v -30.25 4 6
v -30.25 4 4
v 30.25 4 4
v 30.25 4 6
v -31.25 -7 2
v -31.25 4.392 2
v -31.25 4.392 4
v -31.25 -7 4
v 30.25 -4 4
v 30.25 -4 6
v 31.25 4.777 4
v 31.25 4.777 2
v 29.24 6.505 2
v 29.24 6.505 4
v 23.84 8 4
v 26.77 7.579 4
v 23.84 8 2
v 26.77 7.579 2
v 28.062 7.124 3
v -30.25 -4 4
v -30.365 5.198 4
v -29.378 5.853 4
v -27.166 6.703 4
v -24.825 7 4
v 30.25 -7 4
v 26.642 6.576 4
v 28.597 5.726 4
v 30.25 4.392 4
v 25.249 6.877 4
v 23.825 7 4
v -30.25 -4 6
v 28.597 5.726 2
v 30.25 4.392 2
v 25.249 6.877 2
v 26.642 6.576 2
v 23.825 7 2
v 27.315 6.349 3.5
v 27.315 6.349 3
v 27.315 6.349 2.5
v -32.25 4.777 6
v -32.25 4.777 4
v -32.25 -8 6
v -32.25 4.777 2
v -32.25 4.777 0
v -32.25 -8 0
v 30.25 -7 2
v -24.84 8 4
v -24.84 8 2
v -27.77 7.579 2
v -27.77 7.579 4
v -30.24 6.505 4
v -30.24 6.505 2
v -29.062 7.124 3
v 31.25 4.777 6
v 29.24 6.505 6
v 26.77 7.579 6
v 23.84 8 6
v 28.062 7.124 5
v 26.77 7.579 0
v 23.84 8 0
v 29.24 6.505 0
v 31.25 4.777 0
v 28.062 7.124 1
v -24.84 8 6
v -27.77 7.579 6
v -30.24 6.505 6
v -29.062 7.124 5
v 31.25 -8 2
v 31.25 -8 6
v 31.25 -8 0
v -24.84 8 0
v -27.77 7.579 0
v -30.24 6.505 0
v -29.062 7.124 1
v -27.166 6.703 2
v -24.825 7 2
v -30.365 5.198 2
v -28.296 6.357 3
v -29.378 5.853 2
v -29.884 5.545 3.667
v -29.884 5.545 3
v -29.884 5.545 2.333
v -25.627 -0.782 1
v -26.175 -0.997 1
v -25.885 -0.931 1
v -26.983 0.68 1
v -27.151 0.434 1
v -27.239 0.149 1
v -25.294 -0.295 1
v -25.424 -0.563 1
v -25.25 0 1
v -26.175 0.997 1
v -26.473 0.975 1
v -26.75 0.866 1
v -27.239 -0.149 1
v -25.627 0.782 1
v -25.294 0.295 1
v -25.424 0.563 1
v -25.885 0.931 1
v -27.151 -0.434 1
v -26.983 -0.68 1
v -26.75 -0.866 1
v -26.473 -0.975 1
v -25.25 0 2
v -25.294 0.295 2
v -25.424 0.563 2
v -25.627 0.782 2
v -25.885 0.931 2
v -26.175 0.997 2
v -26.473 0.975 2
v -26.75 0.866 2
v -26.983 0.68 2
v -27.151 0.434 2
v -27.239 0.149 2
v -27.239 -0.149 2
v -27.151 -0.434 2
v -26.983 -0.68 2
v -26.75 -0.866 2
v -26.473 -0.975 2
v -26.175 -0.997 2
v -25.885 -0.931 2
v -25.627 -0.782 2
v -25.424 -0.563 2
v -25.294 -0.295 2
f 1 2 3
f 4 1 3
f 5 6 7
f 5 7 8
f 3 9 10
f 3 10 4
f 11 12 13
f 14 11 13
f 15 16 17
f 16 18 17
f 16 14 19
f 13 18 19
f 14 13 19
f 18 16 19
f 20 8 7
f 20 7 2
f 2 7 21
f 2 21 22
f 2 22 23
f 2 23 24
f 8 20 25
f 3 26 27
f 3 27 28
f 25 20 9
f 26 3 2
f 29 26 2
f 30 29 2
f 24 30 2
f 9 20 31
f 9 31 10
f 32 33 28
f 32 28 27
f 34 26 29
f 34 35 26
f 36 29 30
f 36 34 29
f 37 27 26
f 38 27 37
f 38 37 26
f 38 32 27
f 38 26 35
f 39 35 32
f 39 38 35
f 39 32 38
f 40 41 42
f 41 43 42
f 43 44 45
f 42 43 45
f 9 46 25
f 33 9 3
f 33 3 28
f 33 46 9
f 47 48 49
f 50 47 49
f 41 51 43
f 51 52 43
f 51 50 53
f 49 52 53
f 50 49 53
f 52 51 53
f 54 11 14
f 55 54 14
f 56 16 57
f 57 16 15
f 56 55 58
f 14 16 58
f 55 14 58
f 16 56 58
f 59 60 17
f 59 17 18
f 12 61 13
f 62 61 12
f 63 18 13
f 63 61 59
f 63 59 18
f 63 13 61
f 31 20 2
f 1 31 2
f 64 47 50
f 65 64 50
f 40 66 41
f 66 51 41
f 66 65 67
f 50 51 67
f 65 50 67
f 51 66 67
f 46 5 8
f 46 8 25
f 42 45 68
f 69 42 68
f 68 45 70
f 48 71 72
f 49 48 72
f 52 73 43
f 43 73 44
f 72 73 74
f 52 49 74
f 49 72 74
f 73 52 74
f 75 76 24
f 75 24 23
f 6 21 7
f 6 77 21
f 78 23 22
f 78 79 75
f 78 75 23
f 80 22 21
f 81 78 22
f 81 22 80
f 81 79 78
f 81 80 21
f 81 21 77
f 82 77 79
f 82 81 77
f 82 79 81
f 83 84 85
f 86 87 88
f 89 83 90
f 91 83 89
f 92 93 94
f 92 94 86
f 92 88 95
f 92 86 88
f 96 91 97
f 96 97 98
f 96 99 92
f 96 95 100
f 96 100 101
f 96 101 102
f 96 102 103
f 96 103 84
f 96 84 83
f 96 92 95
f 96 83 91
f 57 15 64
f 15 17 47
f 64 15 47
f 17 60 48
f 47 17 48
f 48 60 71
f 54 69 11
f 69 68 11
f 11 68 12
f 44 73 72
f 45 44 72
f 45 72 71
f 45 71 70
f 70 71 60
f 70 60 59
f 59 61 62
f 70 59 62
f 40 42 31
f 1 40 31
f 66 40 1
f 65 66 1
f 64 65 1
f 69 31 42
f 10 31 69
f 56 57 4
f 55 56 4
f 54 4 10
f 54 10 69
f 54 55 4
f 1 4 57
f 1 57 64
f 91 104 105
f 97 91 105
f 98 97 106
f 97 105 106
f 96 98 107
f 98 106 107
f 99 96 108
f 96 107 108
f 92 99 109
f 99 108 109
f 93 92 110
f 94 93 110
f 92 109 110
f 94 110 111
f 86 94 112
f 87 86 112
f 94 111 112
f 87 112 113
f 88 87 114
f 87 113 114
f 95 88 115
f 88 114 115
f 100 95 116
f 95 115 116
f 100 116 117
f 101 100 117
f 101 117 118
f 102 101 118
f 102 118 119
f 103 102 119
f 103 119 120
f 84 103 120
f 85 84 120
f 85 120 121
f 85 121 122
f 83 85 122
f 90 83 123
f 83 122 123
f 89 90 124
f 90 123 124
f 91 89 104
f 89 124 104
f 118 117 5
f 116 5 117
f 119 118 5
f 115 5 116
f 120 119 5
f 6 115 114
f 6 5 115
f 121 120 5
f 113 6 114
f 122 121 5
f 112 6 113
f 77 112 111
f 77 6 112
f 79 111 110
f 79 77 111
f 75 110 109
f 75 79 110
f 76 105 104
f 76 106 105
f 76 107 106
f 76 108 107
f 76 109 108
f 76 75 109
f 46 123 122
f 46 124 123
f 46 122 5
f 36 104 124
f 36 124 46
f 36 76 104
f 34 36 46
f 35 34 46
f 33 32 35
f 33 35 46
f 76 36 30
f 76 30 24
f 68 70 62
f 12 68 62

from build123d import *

# Parameters (mm, degrees)
BOSS_EXTRUDE1_DEPTH = 2
BOSS_EXTRUDE2_DEPTH = 2
SKETCH4_W           = 60.5
SKETCH4_H           = 8
BOSS_EXTRUDE3_DEPTH = 2
SKETCH5_R           = 1
CUT_EXTRUDE1_DEPTH  = 1
CUT_EXTRUDE2_DEPTH  = 1


with BuildPart() as part:
    # Sketch1 → Boss-Extrude1 (new body)
    with BuildSketch(Plane.XY):
        with BuildLine():
            Line((23.840057871, 8), (-24.840057871, 8))
            add(Edge.make_bspline(
                [(-24.840057871, 8), (-29.579374102, 7.859454073), (-32.25, 4.777235297)],
                knots=[0, 0, 0, 1, 1, 1], degree=2))
            Line((-32.25, 4.777235297), (-32.25, -8))
            Line((-32.25, -8), (31.25, -8))
            Line((31.25, -8), (31.25, 4.777235297))
            add(Edge.make_bspline(
                [(23.840057871, 8), (28.579374102, 7.859454073), (31.25, 4.777235297)],
                knots=[0, 0, 0, 1, 1, 1], degree=2))
        make_face()
    extrude(amount=BOSS_EXTRUDE1_DEPTH)

    # Sketch2 → Boss-Extrude2 (add)
    with BuildSketch(Plane.XY.offset(2)):
        with BuildLine():
            Line((-32.25, -8), (31.25, -8))
            Line((31.25, -8), (31.250000012, 4.777235284))
            add(Edge.make_bspline(
                [(31.250000012, 4.777235284), (28.579374112, 7.859454073), (23.840057871, 8)],
                knots=[0, 0, 0, 1, 1, 1], degree=2))
            Line((23.840057871, 8), (-24.84005786, 8))
            add(Edge.make_bspline(
                [(-24.84005786, 8), (-29.579374099, 7.859454077), (-32.25, 4.777235297)],
                knots=[0, 0, 0, 1, 1, 1], degree=2))
            Line((-32.25, 4.777235297), (-32.25, -8))
        make_face()
        with BuildLine():
            Line((-31.25, -7), (30.25, -7))
            Line((30.25, -7), (30.250000006, 4.392275401))
            add(Edge.make_bspline(
                [(30.250000006, 4.392275401), (29.838936293, 4.827054032), (29.388289272, 5.208885934), (28.405623687, 5.863706962), (27.867648486, 6.137833076), (26.761664402, 6.561008933), (26.189843053, 6.714315907), (25.015344092, 6.925422761), (24.421635521, 6.981682834), (23.824977184, 7)],
                knots=[0, 0, 0, 0, 0.25, 0.25, 0.5, 0.5, 0.75, 0.75, 1, 1, 1, 1], degree=3))
            Line((23.824977184, 7), (-24.824977186, 7))
            add(Edge.make_bspline(
                [(-24.824977186, 7), (-25.421773324, 6.981678604), (-26.010765986, 6.925523135), (-27.169262236, 6.718722121), (-27.738796388, 6.568224766), (-28.574197272, 6.250843034), (-28.850434321, 6.12895654), (-29.381068271, 5.858126444), (-29.893359619, 5.559169961), (-30.368382987, 5.203067082), (-30.824570304, 4.818081166), (-31.043507271, 4.610681029), (-31.25, 4.392275407)],
                knots=[0, 0, 0, 0, 0.25, 0.25, 0.5, 0.5, 0.625, 0.625, 0.75, 0.875, 0.875, 1, 1, 1, 1], degree=3))
            Line((-31.25, 4.392275407), (-31.25, -7))
        make_face(mode=Mode.SUBTRACT)
    extrude(amount=BOSS_EXTRUDE2_DEPTH)

    # Sketch4 → Boss-Extrude3 (add)
    with BuildSketch(Plane.XY.offset(4)):
        with BuildLine():
            Line((-32.25, -8), (31.25, -8))
            Line((31.25, -8), (31.250000012, 4.777235284))
            add(Edge.make_bspline(
                [(31.250000012, 4.777235284), (28.579374112, 7.859454073), (23.840057871, 8)],
                knots=[0, 0, 0, 1, 1, 1], degree=2))
            Line((23.840057871, 8), (-24.84005786, 8))
            add(Edge.make_bspline(
                [(-24.84005786, 8), (-29.579374099, 7.859454077), (-32.25, 4.777235297)],
                knots=[0, 0, 0, 1, 1, 1], degree=2))
            Line((-32.25, 4.777235297), (-32.25, -8))
        make_face()
        Rectangle(SKETCH4_W, SKETCH4_H, mode=Mode.SUBTRACT)
    extrude(amount=BOSS_EXTRUDE3_DEPTH)

    # Sketch5 → Cut-Extrude1 (cut)
    with BuildSketch(Plane.XY.offset(2)):
        with Locations((-26.25, 0)):
            Circle(SKETCH5_R)
    extrude(amount=-CUT_EXTRUDE1_DEPTH, mode=Mode.SUBTRACT)

    # Sketch6 → Cut-Extrude2 (cut)
    with BuildSketch(Plane(origin=(0, 0, 0), x_dir=(-1, 0, 0), z_dir=(0, 0, -1))):
        with BuildLine():
            Line((24.840057871, 8), (31.25, 8))
            Line((31.25, 8), (32.25, 4.777235297))
            add(Edge.make_bspline(
                [(24.840057871, 8), (29.579374102, 7.859454073), (32.25, 4.777235297)],
                knots=[0, 0, 0, 1, 1, 1], degree=2))
        make_face()
    cut_extrude2 = extrude(amount=-CUT_EXTRUDE2_DEPTH, mode=Mode.SUBTRACT)

    # Mirror1: Cut-Extrude2 across plane
    add(cut_extrude2.mirror(Plane(origin=(0, 0, 0), x_dir=(0, 0, 1), z_dir=(1, 0, 0))), mode=Mode.SUBTRACT)


solid = part.part
